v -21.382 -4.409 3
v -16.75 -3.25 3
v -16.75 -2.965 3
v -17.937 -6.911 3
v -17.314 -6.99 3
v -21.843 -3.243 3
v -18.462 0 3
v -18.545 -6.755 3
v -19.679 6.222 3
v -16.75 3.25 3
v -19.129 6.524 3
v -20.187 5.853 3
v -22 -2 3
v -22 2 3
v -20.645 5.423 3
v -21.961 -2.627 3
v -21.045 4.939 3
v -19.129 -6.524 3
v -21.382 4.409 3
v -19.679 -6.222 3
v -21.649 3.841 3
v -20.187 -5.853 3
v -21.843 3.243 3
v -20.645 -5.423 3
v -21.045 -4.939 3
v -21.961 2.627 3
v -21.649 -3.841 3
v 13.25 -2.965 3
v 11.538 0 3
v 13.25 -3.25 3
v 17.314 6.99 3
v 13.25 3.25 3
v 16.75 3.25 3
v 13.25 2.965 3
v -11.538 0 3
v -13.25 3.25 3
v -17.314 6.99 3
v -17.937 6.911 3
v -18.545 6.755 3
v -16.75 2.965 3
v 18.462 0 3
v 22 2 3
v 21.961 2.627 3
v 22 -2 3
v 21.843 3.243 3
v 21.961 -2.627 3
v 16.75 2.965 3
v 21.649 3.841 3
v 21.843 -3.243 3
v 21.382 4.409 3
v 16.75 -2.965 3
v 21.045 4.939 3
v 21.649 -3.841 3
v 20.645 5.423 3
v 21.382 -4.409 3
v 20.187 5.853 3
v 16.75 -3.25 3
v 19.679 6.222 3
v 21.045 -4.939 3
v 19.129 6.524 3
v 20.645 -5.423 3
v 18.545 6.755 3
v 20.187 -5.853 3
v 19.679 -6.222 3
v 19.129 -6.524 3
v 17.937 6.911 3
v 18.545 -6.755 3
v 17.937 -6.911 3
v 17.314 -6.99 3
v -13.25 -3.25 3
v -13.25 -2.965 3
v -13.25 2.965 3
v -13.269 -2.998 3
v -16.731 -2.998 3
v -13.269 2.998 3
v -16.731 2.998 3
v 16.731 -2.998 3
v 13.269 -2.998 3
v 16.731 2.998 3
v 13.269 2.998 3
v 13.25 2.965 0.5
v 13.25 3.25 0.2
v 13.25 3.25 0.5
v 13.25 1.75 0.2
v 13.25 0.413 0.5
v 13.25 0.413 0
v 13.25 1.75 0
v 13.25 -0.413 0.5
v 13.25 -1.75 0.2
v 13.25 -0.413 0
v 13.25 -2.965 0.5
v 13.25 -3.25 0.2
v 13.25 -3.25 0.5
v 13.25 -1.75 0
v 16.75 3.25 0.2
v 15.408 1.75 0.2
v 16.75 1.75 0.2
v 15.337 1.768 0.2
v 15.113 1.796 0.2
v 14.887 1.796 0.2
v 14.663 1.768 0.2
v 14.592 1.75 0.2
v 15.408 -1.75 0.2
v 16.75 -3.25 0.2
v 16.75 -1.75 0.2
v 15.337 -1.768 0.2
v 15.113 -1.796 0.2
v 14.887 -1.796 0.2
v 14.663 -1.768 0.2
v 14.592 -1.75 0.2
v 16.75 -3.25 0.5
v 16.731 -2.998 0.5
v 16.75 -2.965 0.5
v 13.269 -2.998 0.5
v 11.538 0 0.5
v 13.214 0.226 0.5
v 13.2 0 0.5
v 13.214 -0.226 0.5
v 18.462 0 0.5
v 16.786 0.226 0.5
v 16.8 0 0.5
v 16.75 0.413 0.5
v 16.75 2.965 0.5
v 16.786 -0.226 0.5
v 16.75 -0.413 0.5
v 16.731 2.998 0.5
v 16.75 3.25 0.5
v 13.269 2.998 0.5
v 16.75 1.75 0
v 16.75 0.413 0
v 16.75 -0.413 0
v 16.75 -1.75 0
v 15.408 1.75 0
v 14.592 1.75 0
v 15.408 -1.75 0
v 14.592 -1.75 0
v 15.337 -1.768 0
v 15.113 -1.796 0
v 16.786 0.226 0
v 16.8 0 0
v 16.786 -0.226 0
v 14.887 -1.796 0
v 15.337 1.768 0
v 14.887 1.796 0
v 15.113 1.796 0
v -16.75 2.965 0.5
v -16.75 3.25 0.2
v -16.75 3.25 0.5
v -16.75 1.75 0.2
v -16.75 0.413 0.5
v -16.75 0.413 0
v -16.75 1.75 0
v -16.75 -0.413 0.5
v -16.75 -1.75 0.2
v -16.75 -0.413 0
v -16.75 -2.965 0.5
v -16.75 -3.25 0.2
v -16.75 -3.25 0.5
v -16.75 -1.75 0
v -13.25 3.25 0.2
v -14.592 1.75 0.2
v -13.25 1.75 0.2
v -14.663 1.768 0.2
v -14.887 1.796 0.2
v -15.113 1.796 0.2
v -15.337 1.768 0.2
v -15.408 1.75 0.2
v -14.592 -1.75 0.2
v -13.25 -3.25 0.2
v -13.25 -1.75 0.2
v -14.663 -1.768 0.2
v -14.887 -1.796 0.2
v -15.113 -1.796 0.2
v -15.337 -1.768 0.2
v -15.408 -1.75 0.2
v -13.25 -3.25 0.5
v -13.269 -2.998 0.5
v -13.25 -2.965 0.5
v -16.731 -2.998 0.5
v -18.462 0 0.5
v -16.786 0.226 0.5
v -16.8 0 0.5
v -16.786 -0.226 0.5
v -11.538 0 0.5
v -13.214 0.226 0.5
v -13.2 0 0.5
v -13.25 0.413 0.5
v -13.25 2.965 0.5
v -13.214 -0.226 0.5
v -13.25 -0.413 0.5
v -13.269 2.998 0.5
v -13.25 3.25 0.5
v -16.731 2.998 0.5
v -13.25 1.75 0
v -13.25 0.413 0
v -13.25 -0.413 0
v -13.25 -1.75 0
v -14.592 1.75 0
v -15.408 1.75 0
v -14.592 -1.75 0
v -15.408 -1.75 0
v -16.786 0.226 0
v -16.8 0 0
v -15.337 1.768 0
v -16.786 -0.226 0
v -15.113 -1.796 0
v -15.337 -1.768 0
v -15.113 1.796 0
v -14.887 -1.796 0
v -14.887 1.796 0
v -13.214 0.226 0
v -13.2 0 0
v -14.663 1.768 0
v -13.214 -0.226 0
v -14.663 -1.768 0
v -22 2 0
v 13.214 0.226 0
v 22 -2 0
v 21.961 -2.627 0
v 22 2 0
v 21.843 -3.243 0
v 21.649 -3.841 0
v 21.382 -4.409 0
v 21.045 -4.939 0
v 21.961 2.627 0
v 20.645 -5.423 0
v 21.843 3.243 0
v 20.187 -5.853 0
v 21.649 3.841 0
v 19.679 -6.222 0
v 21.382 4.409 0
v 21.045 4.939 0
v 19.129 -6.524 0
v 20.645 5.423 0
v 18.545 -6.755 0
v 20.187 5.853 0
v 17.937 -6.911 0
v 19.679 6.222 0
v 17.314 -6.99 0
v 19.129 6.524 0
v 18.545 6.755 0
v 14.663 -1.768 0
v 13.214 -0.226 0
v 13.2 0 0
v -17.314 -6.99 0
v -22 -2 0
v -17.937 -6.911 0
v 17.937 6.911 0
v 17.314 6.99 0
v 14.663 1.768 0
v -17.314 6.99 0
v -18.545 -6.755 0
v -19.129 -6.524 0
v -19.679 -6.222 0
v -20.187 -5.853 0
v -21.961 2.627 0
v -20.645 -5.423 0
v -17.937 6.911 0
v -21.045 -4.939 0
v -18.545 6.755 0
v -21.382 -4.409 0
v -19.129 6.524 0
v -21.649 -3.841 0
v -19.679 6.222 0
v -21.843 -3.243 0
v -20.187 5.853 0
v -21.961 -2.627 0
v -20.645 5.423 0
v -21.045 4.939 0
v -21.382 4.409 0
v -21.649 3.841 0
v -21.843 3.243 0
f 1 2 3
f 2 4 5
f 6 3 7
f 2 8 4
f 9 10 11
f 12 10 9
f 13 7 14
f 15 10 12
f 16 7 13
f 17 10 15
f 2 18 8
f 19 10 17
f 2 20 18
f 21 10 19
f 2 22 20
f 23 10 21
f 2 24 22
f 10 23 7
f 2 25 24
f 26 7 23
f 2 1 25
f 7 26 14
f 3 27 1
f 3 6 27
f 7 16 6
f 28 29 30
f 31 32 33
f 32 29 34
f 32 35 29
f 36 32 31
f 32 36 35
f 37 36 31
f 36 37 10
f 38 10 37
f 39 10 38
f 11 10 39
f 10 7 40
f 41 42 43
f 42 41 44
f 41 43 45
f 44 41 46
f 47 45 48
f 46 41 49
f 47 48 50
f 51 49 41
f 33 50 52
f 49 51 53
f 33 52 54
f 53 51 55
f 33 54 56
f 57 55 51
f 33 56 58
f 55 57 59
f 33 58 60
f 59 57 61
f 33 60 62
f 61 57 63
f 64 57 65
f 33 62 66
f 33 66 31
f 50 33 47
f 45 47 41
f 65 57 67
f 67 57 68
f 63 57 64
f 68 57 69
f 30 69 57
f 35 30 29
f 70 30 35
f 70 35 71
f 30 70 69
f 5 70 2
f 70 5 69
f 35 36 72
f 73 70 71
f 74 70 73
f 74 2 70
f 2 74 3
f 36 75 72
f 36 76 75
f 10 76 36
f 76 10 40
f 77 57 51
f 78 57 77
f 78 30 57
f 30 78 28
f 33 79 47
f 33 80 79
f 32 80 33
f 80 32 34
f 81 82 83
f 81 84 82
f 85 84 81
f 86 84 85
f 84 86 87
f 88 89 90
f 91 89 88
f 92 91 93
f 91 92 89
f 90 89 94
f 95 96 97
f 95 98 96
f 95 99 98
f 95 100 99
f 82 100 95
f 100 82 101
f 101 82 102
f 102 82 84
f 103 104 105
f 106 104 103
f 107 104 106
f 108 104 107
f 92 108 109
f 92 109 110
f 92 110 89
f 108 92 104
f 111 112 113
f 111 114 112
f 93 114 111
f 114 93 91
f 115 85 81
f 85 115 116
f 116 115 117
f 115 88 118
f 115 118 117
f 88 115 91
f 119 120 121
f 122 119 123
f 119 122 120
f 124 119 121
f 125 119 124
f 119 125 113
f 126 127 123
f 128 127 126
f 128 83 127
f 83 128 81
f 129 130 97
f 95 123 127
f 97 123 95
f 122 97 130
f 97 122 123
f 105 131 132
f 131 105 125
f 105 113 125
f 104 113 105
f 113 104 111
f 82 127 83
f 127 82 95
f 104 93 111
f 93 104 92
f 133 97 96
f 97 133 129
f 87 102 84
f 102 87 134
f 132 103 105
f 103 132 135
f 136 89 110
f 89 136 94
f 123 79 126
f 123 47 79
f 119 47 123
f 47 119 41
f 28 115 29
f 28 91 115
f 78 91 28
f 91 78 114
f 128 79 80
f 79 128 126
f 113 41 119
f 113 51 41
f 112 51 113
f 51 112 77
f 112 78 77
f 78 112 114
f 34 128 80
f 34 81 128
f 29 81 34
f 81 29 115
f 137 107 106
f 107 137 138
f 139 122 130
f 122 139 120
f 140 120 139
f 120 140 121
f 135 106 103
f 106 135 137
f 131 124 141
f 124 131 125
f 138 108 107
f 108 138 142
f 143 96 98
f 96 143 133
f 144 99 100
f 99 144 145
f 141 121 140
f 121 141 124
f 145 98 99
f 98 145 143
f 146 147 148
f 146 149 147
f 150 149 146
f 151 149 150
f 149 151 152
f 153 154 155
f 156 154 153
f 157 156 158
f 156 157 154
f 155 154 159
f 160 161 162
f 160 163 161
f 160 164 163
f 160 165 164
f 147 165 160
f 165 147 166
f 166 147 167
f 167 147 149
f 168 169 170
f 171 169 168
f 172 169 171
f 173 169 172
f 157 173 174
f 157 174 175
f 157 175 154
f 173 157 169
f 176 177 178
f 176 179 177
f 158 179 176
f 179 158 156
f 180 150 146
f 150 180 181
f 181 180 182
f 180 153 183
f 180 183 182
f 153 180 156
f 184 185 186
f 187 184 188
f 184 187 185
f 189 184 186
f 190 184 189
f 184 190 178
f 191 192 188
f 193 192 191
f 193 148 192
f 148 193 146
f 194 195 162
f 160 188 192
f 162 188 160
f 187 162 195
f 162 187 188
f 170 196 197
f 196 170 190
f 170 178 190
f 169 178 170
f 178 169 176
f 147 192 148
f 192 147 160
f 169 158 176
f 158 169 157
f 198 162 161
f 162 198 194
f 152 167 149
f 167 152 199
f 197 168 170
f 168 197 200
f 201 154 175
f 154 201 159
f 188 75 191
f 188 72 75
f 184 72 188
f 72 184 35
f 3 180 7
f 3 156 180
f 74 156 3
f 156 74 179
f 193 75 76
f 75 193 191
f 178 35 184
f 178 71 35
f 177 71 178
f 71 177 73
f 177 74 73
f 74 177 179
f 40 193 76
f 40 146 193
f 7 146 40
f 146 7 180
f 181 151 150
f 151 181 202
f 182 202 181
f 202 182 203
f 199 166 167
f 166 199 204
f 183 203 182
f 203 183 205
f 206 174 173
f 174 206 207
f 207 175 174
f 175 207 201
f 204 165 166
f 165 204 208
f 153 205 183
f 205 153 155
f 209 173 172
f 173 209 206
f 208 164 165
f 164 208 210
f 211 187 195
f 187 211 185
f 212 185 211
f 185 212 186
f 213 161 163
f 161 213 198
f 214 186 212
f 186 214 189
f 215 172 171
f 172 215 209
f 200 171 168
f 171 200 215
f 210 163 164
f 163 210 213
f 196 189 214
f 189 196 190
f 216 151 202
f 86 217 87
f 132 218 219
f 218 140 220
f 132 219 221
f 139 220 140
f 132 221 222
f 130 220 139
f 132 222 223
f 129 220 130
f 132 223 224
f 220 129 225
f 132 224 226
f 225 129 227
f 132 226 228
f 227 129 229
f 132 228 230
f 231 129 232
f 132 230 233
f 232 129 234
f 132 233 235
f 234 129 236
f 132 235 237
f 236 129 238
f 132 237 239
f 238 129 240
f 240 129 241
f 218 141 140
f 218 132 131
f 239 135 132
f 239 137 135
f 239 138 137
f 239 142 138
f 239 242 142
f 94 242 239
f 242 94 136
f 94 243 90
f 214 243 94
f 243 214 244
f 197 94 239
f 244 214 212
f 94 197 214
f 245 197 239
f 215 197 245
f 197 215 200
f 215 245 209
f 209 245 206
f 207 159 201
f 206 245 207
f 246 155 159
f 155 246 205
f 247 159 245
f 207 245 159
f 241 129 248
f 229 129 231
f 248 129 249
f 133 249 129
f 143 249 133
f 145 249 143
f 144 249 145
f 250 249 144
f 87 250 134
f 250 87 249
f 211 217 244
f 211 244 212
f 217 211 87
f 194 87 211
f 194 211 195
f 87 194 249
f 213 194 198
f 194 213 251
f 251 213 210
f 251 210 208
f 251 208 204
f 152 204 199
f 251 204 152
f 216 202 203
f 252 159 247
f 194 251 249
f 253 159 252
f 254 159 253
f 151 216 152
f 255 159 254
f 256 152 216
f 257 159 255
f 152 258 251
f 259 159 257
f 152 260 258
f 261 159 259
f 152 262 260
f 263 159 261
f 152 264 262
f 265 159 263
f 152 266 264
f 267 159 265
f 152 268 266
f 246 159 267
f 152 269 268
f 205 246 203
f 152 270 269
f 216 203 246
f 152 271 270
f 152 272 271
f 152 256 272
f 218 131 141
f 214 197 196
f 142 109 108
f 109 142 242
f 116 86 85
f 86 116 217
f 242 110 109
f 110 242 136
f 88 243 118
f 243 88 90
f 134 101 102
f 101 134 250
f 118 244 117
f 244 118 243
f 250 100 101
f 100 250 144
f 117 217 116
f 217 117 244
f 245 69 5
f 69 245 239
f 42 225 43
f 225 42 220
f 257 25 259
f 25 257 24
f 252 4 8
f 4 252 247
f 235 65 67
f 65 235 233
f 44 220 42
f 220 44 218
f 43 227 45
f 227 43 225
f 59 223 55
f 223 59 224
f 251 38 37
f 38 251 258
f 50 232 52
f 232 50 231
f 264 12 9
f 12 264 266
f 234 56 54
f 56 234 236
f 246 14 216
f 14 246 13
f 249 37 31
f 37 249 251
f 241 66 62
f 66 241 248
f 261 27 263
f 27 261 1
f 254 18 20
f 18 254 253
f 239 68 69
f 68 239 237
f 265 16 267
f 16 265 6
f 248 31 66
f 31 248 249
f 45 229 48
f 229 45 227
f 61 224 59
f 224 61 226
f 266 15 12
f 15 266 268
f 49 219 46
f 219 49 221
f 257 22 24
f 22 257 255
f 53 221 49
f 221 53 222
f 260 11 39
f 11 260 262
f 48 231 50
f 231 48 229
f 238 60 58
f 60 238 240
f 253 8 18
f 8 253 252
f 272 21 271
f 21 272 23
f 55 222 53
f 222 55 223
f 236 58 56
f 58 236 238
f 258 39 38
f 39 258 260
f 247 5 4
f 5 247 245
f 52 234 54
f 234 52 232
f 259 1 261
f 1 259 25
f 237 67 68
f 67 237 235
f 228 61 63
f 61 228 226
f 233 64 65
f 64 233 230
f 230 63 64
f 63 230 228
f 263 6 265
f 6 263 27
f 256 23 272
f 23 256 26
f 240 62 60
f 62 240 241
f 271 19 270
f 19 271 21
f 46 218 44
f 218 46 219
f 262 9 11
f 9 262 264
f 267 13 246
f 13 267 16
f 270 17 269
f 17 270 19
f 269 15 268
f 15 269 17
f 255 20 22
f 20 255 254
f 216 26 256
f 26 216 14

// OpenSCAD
$fn = 50;


difference() {
	union() {
		hull() {
			translate(v = [-17.0000000000, 2.0000000000, 0]) {
				cylinder(h = 3, r = 5);
			}
			translate(v = [17.0000000000, 2.0000000000, 0]) {
				cylinder(h = 3, r = 5);
			}
			translate(v = [-17.0000000000, -2.0000000000, 0]) {
				cylinder(h = 3, r = 5);
			}
			translate(v = [17.0000000000, -2.0000000000, 0]) {
				cylinder(h = 3, r = 5);
			}
		}
	}
	union() {
		translate(v = [15.0000000000, 0, -20]) {
			rotate(a = [0, 180, 0]) {
				difference() {
					union() {
						translate(v = [0, 0, -23.0000000000]) {
							rotate(a = [0, 0, 0]) {
								difference() {
									union() {
										#translate(v = [-1.7500000000, -3.2500000000, -0.3000000000]) {
											cube(size = [3.5000000000, 6.5000000000, 0.3000000000]);
										}
										#translate(v = [-1.7500000000, -1.7500000000, -0.6000000000]) {
											cube(size = [3.5000000000, 3.5000000000, 0.3000000000]);
										}
										#translate(v = [-1.7500000000, -3.2500000000, 2.5000000000]) {
											cube(size = [3.5000000000, 6.5000000000, 0.3000000000]);
										}
										#translate(v = [-1.7500000000, -1.7500000000, 2.8000000000]) {
											cube(size = [3.5000000000, 3.5000000000, 0.3000000000]);
										}
										#linear_extrude(height = 2.5000000000) {
											polygon(points = [[3.4620000000, 0.0000000000], [1.7310000000, 2.9981799479], [-1.7310000000, 2.9981799479], [-3.4620000000, 0.0000000000], [-1.7310000000, -2.9981799479], [1.7310000000, -2.9981799479]]);
										}
										#translate(v = [-1.7500000000, -3.2500000000, -0.3000000000]) {
											cube(size = [3.5000000000, 6.5000000000, 0.3000000000]);
										}
										#translate(v = [-1.7500000000, -1.7500000000, -0.6000000000]) {
											cube(size = [3.5000000000, 3.5000000000, 0.3000000000]);
										}
										#translate(v = [-1.7500000000, -3.2500000000, 2.5000000000]) {
											cube(size = [3.5000000000, 6.5000000000, 0.3000000000]);
										}
										#translate(v = [-1.7500000000, -1.7500000000, 2.8000000000]) {
											cube(size = [3.5000000000, 3.5000000000, 0.3000000000]);
										}
										#translate(v = [-1.7500000000, -3.2500000000, -0.3000000000]) {
											cube(size = [3.5000000000, 6.5000000000, 0.3000000000]);
										}
										#translate(v = [-1.7500000000, -1.7500000000, -0.6000000000]) {
											cube(size = [3.5000000000, 3.5000000000, 0.3000000000]);
										}
										#translate(v = [-1.7500000000, -3.2500000000, 2.5000000000]) {
											cube(size = [3.5000000000, 6.5000000000, 0.3000000000]);
										}
										#translate(v = [-1.7500000000, -1.7500000000, 2.8000000000]) {
											cube(size = [3.5000000000, 3.5000000000, 0.3000000000]);
										}
									}
									union();
								}
							}
						}
						translate(v = [0, 0, -23.0000000000]) {
							rotate(a = [0, 0, 0]) {
								difference() {
									union() {
										#translate(v = [-1.7500000000, -3.2500000000, -0.3000000000]) {
											cube(size = [3.5000000000, 6.5000000000, 0.3000000000]);
										}
										#translate(v = [-1.7500000000, -1.7500000000, -0.6000000000]) {
											cube(size = [3.5000000000, 3.5000000000, 0.3000000000]);
										}
										#translate(v = [-1.7500000000, -3.2500000000, 2.5000000000]) {
											cube(size = [3.5000000000, 6.5000000000, 0.3000000000]);
										}
										#translate(v = [-1.7500000000, -1.7500000000, 2.8000000000]) {
											cube(size = [3.5000000000, 3.5000000000, 0.3000000000]);
										}
										#linear_extrude(height = 2.5000000000) {
											polygon(points = [[3.4620000000, 0.0000000000], [1.7310000000, 2.9981799479], [-1.7310000000, 2.9981799479], [-3.4620000000, 0.0000000000], [-1.7310000000, -2.9981799479], [1.7310000000, -2.9981799479]]);
										}
										#translate(v = [-1.7500000000, -3.2500000000, -0.3000000000]) {
											cube(size = [3.5000000000, 6.5000000000, 0.3000000000]);
										}
										#translate(v = [-1.7500000000, -1.7500000000, -0.6000000000]) {
											cube(size = [3.5000000000, 3.5000000000, 0.3000000000]);
										}
										#translate(v = [-1.7500000000, -3.2500000000, 2.5000000000]) {
											cube(size = [3.5000000000, 6.5000000000, 0.3000000000]);
										}
										#translate(v = [-1.7500000000, -1.7500000000, 2.8000000000]) {
											cube(size = [3.5000000000, 3.5000000000, 0.3000000000]);
										}
										#translate(v = [-1.7500000000, -3.2500000000, -0.3000000000]) {
											cube(size = [3.5000000000, 6.5000000000, 0.3000000000]);
										}
										#translate(v = [-1.7500000000, -1.7500000000, -0.6000000000]) {
											cube(size = [3.5000000000, 3.5000000000, 0.3000000000]);
										}
										#translate(v = [-1.7500000000, -3.2500000000, 2.5000000000]) {
											cube(size = [3.5000000000, 6.5000000000, 0.3000000000]);
										}
										#translate(v = [-1.7500000000, -1.7500000000, 2.8000000000]) {
											cube(size = [3.5000000000, 3.5000000000, 0.3000000000]);
										}
									}
									union();
								}
							}
						}
						translate(v = [0, 0, -23.0000000000]) {
							rotate(a = [0, 0, 0]) {
								difference() {
									union() {
										#translate(v = [-1.7500000000, -3.2500000000, -0.3000000000]) {
											cube(size = [3.5000000000, 6.5000000000, 0.3000000000]);
										}
										#translate(v = [-1.7500000000, -1.7500000000, -0.6000000000]) {
											cube(size = [3.5000000000, 3.5000000000, 0.3000000000]);
										}
										#translate(v = [-1.7500000000, -3.2500000000, 2.5000000000]) {
											cube(size = [3.5000000000, 6.5000000000, 0.3000000000]);
										}
										#translate(v = [-1.7500000000, -1.7500000000, 2.8000000000]) {
											cube(size = [3.5000000000, 3.5000000000, 0.3000000000]);
										}
										#linear_extrude(height = 2.5000000000) {
											polygon(points = [[3.4620000000, 0.0000000000], [1.7310000000, 2.9981799479], [-1.7310000000, 2.9981799479], [-3.4620000000, 0.0000000000], [-1.7310000000, -2.9981799479], [1.7310000000, -2.9981799479]]);
										}
										#translate(v = [-1.7500000000, -3.2500000000, -0.3000000000]) {
											cube(size = [3.5000000000, 6.5000000000, 0.3000000000]);
										}
										#translate(v = [-1.7500000000, -1.7500000000, -0.6000000000]) {
											cube(size = [3.5000000000, 3.5000000000, 0.3000000000]);
										}
										#translate(v = [-1.7500000000, -3.2500000000, 2.5000000000]) {
											cube(size = [3.5000000000, 6.5000000000, 0.3000000000]);
										}
										#translate(v = [-1.7500000000, -1.7500000000, 2.8000000000]) {
											cube(size = [3.5000000000, 3.5000000000, 0.3000000000]);
										}
										#translate(v = [-1.7500000000, -3.2500000000, -0.3000000000]) {
											cube(size = [3.5000000000, 6.5000000000, 0.3000000000]);
										}
										#translate(v = [-1.7500000000, -1.7500000000, -0.6000000000]) {
											cube(size = [3.5000000000, 3.5000000000, 0.3000000000]);
										}
										#translate(v = [-1.7500000000, -3.2500000000, 2.5000000000]) {
											cube(size = [3.5000000000, 6.5000000000, 0.3000000000]);
										}
										#translate(v = [-1.7500000000, -1.7500000000, 2.8000000000]) {
											cube(size = [3.5000000000, 3.5000000000, 0.3000000000]);
										}
									}
									union();
								}
							}
						}
						#translate(v = [0, 0, -23.0000000000]) {
							cylinder(h = 23, r = 1.5000000000);
						}
						#translate(v = [0, 0, -1.9000000000]) {
							cylinder(h = 1.9000000000, r1 = 1.8000000000, r2 = 3.6000000000);
						}
						#translate(v = [0, 0, -23.0000000000]) {
							cylinder(h = 23, r = 1.8000000000);
						}
						#translate(v = [0, 0, -23.0000000000]) {
							cylinder(h = 23, r = 1.5000000000);
						}
					}
					union();
				}
			}
		}
		translate(v = [-15.0000000000, 0, -20]) {
			rotate(a = [0, 180, 0]) {
				difference() {
					union() {
						translate(v = [0, 0, -23.0000000000]) {
							rotate(a = [0, 0, 0]) {
								difference() {
									union() {
										#translate(v = [-1.7500000000, -3.2500000000, -0.3000000000]) {
											cube(size = [3.5000000000, 6.5000000000, 0.3000000000]);
										}
										#translate(v = [-1.7500000000, -1.7500000000, -0.6000000000]) {
											cube(size = [3.5000000000, 3.5000000000, 0.3000000000]);
										}
										#translate(v = [-1.7500000000, -3.2500000000, 2.5000000000]) {
											cube(size = [3.5000000000, 6.5000000000, 0.3000000000]);
										}
										#translate(v = [-1.7500000000, -1.7500000000, 2.8000000000]) {
											cube(size = [3.5000000000, 3.5000000000, 0.3000000000]);
										}
										#linear_extrude(height = 2.5000000000) {
											polygon(points = [[3.4620000000, 0.0000000000], [1.7310000000, 2.9981799479], [-1.7310000000, 2.9981799479], [-3.4620000000, 0.0000000000], [-1.7310000000, -2.9981799479], [1.7310000000, -2.9981799479]]);
										}
										#translate(v = [-1.7500000000, -3.2500000000, -0.3000000000]) {
											cube(size = [3.5000000000, 6.5000000000, 0.3000000000]);
										}
										#translate(v = [-1.7500000000, -1.7500000000, -0.6000000000]) {
											cube(size = [3.5000000000, 3.5000000000, 0.3000000000]);
										}
										#translate(v = [-1.7500000000, -3.2500000000, 2.5000000000]) {
											cube(size = [3.5000000000, 6.5000000000, 0.3000000000]);
										}
										#translate(v = [-1.7500000000, -1.7500000000, 2.8000000000]) {
											cube(size = [3.5000000000, 3.5000000000, 0.3000000000]);
										}
										#translate(v = [-1.7500000000, -3.2500000000, -0.3000000000]) {
											cube(size = [3.5000000000, 6.5000000000, 0.3000000000]);
										}
										#translate(v = [-1.7500000000, -1.7500000000, -0.6000000000]) {
											cube(size = [3.5000000000, 3.5000000000, 0.3000000000]);
										}
										#translate(v = [-1.7500000000, -3.2500000000, 2.5000000000]) {
											cube(size = [3.5000000000, 6.5000000000, 0.3000000000]);
										}
										#translate(v = [-1.7500000000, -1.7500000000, 2.8000000000]) {
											cube(size = [3.5000000000, 3.5000000000, 0.3000000000]);
										}
									}
									union();
								}
							}
						}
						translate(v = [0, 0, -23.0000000000]) {
							rotate(a = [0, 0, 0]) {
								difference() {
									union() {
										#translate(v = [-1.7500000000, -3.2500000000, -0.3000000000]) {
											cube(size = [3.5000000000, 6.5000000000, 0.3000000000]);
										}
										#translate(v = [-1.7500000000, -1.7500000000, -0.6000000000]) {
											cube(size = [3.5000000000, 3.5000000000, 0.3000000000]);
										}
										#translate(v = [-1.7500000000, -3.2500000000, 2.5000000000]) {
											cube(size = [3.5000000000, 6.5000000000, 0.3000000000]);
										}
										#translate(v = [-1.7500000000, -1.7500000000, 2.8000000000]) {
											cube(size = [3.5000000000, 3.5000000000, 0.3000000000]);
										}
										#linear_extrude(height = 2.5000000000) {
											polygon(points = [[3.4620000000, 0.0000000000], [1.7310000000, 2.9981799479], [-1.7310000000, 2.9981799479], [-3.4620000000, 0.0000000000], [-1.7310000000, -2.9981799479], [1.7310000000, -2.9981799479]]);
										}
										#translate(v = [-1.7500000000, -3.2500000000, -0.3000000000]) {
											cube(size = [3.5000000000, 6.5000000000, 0.3000000000]);
										}
										#translate(v = [-1.7500000000, -1.7500000000, -0.6000000000]) {
											cube(size = [3.5000000000, 3.5000000000, 0.3000000000]);
										}
										#translate(v = [-1.7500000000, -3.2500000000, 2.5000000000]) {
											cube(size = [3.5000000000, 6.5000000000, 0.3000000000]);
										}
										#translate(v = [-1.7500000000, -1.7500000000, 2.8000000000]) {
											cube(size = [3.5000000000, 3.5000000000, 0.3000000000]);
										}
										#translate(v = [-1.7500000000, -3.2500000000, -0.3000000000]) {
											cube(size = [3.5000000000, 6.5000000000, 0.3000000000]);
										}
										#translate(v = [-1.7500000000, -1.7500000000, -0.6000000000]) {
											cube(size = [3.5000000000, 3.5000000000, 0.3000000000]);
										}
										#translate(v = [-1.7500000000, -3.2500000000, 2.5000000000]) {
											cube(size = [3.5000000000, 6.5000000000, 0.3000000000]);
										}
										#translate(v = [-1.7500000000, -1.7500000000, 2.8000000000]) {
											cube(size = [3.5000000000, 3.5000000000, 0.3000000000]);
										}
									}
									union();
								}
							}
						}
						translate(v = [0, 0, -23.0000000000]) {
							rotate(a = [0, 0, 0]) {
								difference() {
									union() {
										#translate(v = [-1.7500000000, -3.2500000000, -0.3000000000]) {
											cube(size = [3.5000000000, 6.5000000000, 0.3000000000]);
										}
										#translate(v = [-1.7500000000, -1.7500000000, -0.6000000000]) {
											cube(size = [3.5000000000, 3.5000000000, 0.3000000000]);
										}
										#translate(v = [-1.7500000000, -3.2500000000, 2.5000000000]) {
											cube(size = [3.5000000000, 6.5000000000, 0.3000000000]);
										}
										#translate(v = [-1.7500000000, -1.7500000000, 2.8000000000]) {
											cube(size = [3.5000000000, 3.5000000000, 0.3000000000]);
										}
										#linear_extrude(height = 2.5000000000) {
											polygon(points = [[3.4620000000, 0.0000000000], [1.7310000000, 2.9981799479], [-1.7310000000, 2.9981799479], [-3.4620000000, 0.0000000000], [-1.7310000000, -2.9981799479], [1.7310000000, -2.9981799479]]);
										}
										#translate(v = [-1.7500000000, -3.2500000000, -0.3000000000]) {
											cube(size = [3.5000000000, 6.5000000000, 0.3000000000]);
										}
										#translate(v = [-1.7500000000, -1.7500000000, -0.6000000000]) {
											cube(size = [3.5000000000, 3.5000000000, 0.3000000000]);
										}
										#translate(v = [-1.7500000000, -3.2500000000, 2.5000000000]) {
											cube(size = [3.5000000000, 6.5000000000, 0.3000000000]);
										}
										#translate(v = [-1.7500000000, -1.7500000000, 2.8000000000]) {
											cube(size = [3.5000000000, 3.5000000000, 0.3000000000]);
										}
										#translate(v = [-1.7500000000, -3.2500000000, -0.3000000000]) {
											cube(size = [3.5000000000, 6.5000000000, 0.3000000000]);
										}
										#translate(v = [-1.7500000000, -1.7500000000, -0.6000000000]) {
											cube(size = [3.5000000000, 3.5000000000, 0.3000000000]);
										}
										#translate(v = [-1.7500000000, -3.2500000000, 2.5000000000]) {
											cube(size = [3.5000000000, 6.5000000000, 0.3000000000]);
										}
										#translate(v = [-1.7500000000, -1.7500000000, 2.8000000000]) {
											cube(size = [3.5000000000, 3.5000000000, 0.3000000000]);
										}
									}
									union();
								}
							}
						}
						#translate(v = [0, 0, -23.0000000000]) {
							cylinder(h = 23, r = 1.5000000000);
						}
						#translate(v = [0, 0, -1.9000000000]) {
							cylinder(h = 1.9000000000, r1 = 1.8000000000, r2 = 3.6000000000);
						}
						#translate(v = [0, 0, -23.0000000000]) {
							cylinder(h = 23, r = 1.8000000000);
						}
						#translate(v = [0, 0, -23.0000000000]) {
							cylinder(h = 23, r = 1.5000000000);
						}
					}
					union();
				}
			}
		}
		translate(v = [-15.0000000000, 0.0000000000, 0]) {
			cylinder(h = 3, r = 1.8000000000);
		}
		translate(v = [15.0000000000, 0.0000000000, 0]) {
			cylinder(h = 3, r = 1.8000000000);
		}
		translate(v = [-15.0000000000, 0.0000000000, 0]) {
			cylinder(h = 3, r = 1.8000000000);
		}
		translate(v = [15.0000000000, 0.0000000000, 0]) {
			cylinder(h = 3, r = 1.8000000000);
		}
		translate(v = [-15.0000000000, 0.0000000000, 0]) {
			cylinder(h = 3, r = 1.8000000000);
		}
		translate(v = [15.0000000000, 0.0000000000, 0]) {
			cylinder(h = 3, r = 1.8000000000);
		}
		translate(v = [-15.0000000000, 0.0000000000, 0]) {
			cylinder(h = 3, r = 1.8000000000);
		}
		translate(v = [15.0000000000, 0.0000000000, 0]) {
			cylinder(h = 3, r = 1.8000000000);
		}
	}
}
